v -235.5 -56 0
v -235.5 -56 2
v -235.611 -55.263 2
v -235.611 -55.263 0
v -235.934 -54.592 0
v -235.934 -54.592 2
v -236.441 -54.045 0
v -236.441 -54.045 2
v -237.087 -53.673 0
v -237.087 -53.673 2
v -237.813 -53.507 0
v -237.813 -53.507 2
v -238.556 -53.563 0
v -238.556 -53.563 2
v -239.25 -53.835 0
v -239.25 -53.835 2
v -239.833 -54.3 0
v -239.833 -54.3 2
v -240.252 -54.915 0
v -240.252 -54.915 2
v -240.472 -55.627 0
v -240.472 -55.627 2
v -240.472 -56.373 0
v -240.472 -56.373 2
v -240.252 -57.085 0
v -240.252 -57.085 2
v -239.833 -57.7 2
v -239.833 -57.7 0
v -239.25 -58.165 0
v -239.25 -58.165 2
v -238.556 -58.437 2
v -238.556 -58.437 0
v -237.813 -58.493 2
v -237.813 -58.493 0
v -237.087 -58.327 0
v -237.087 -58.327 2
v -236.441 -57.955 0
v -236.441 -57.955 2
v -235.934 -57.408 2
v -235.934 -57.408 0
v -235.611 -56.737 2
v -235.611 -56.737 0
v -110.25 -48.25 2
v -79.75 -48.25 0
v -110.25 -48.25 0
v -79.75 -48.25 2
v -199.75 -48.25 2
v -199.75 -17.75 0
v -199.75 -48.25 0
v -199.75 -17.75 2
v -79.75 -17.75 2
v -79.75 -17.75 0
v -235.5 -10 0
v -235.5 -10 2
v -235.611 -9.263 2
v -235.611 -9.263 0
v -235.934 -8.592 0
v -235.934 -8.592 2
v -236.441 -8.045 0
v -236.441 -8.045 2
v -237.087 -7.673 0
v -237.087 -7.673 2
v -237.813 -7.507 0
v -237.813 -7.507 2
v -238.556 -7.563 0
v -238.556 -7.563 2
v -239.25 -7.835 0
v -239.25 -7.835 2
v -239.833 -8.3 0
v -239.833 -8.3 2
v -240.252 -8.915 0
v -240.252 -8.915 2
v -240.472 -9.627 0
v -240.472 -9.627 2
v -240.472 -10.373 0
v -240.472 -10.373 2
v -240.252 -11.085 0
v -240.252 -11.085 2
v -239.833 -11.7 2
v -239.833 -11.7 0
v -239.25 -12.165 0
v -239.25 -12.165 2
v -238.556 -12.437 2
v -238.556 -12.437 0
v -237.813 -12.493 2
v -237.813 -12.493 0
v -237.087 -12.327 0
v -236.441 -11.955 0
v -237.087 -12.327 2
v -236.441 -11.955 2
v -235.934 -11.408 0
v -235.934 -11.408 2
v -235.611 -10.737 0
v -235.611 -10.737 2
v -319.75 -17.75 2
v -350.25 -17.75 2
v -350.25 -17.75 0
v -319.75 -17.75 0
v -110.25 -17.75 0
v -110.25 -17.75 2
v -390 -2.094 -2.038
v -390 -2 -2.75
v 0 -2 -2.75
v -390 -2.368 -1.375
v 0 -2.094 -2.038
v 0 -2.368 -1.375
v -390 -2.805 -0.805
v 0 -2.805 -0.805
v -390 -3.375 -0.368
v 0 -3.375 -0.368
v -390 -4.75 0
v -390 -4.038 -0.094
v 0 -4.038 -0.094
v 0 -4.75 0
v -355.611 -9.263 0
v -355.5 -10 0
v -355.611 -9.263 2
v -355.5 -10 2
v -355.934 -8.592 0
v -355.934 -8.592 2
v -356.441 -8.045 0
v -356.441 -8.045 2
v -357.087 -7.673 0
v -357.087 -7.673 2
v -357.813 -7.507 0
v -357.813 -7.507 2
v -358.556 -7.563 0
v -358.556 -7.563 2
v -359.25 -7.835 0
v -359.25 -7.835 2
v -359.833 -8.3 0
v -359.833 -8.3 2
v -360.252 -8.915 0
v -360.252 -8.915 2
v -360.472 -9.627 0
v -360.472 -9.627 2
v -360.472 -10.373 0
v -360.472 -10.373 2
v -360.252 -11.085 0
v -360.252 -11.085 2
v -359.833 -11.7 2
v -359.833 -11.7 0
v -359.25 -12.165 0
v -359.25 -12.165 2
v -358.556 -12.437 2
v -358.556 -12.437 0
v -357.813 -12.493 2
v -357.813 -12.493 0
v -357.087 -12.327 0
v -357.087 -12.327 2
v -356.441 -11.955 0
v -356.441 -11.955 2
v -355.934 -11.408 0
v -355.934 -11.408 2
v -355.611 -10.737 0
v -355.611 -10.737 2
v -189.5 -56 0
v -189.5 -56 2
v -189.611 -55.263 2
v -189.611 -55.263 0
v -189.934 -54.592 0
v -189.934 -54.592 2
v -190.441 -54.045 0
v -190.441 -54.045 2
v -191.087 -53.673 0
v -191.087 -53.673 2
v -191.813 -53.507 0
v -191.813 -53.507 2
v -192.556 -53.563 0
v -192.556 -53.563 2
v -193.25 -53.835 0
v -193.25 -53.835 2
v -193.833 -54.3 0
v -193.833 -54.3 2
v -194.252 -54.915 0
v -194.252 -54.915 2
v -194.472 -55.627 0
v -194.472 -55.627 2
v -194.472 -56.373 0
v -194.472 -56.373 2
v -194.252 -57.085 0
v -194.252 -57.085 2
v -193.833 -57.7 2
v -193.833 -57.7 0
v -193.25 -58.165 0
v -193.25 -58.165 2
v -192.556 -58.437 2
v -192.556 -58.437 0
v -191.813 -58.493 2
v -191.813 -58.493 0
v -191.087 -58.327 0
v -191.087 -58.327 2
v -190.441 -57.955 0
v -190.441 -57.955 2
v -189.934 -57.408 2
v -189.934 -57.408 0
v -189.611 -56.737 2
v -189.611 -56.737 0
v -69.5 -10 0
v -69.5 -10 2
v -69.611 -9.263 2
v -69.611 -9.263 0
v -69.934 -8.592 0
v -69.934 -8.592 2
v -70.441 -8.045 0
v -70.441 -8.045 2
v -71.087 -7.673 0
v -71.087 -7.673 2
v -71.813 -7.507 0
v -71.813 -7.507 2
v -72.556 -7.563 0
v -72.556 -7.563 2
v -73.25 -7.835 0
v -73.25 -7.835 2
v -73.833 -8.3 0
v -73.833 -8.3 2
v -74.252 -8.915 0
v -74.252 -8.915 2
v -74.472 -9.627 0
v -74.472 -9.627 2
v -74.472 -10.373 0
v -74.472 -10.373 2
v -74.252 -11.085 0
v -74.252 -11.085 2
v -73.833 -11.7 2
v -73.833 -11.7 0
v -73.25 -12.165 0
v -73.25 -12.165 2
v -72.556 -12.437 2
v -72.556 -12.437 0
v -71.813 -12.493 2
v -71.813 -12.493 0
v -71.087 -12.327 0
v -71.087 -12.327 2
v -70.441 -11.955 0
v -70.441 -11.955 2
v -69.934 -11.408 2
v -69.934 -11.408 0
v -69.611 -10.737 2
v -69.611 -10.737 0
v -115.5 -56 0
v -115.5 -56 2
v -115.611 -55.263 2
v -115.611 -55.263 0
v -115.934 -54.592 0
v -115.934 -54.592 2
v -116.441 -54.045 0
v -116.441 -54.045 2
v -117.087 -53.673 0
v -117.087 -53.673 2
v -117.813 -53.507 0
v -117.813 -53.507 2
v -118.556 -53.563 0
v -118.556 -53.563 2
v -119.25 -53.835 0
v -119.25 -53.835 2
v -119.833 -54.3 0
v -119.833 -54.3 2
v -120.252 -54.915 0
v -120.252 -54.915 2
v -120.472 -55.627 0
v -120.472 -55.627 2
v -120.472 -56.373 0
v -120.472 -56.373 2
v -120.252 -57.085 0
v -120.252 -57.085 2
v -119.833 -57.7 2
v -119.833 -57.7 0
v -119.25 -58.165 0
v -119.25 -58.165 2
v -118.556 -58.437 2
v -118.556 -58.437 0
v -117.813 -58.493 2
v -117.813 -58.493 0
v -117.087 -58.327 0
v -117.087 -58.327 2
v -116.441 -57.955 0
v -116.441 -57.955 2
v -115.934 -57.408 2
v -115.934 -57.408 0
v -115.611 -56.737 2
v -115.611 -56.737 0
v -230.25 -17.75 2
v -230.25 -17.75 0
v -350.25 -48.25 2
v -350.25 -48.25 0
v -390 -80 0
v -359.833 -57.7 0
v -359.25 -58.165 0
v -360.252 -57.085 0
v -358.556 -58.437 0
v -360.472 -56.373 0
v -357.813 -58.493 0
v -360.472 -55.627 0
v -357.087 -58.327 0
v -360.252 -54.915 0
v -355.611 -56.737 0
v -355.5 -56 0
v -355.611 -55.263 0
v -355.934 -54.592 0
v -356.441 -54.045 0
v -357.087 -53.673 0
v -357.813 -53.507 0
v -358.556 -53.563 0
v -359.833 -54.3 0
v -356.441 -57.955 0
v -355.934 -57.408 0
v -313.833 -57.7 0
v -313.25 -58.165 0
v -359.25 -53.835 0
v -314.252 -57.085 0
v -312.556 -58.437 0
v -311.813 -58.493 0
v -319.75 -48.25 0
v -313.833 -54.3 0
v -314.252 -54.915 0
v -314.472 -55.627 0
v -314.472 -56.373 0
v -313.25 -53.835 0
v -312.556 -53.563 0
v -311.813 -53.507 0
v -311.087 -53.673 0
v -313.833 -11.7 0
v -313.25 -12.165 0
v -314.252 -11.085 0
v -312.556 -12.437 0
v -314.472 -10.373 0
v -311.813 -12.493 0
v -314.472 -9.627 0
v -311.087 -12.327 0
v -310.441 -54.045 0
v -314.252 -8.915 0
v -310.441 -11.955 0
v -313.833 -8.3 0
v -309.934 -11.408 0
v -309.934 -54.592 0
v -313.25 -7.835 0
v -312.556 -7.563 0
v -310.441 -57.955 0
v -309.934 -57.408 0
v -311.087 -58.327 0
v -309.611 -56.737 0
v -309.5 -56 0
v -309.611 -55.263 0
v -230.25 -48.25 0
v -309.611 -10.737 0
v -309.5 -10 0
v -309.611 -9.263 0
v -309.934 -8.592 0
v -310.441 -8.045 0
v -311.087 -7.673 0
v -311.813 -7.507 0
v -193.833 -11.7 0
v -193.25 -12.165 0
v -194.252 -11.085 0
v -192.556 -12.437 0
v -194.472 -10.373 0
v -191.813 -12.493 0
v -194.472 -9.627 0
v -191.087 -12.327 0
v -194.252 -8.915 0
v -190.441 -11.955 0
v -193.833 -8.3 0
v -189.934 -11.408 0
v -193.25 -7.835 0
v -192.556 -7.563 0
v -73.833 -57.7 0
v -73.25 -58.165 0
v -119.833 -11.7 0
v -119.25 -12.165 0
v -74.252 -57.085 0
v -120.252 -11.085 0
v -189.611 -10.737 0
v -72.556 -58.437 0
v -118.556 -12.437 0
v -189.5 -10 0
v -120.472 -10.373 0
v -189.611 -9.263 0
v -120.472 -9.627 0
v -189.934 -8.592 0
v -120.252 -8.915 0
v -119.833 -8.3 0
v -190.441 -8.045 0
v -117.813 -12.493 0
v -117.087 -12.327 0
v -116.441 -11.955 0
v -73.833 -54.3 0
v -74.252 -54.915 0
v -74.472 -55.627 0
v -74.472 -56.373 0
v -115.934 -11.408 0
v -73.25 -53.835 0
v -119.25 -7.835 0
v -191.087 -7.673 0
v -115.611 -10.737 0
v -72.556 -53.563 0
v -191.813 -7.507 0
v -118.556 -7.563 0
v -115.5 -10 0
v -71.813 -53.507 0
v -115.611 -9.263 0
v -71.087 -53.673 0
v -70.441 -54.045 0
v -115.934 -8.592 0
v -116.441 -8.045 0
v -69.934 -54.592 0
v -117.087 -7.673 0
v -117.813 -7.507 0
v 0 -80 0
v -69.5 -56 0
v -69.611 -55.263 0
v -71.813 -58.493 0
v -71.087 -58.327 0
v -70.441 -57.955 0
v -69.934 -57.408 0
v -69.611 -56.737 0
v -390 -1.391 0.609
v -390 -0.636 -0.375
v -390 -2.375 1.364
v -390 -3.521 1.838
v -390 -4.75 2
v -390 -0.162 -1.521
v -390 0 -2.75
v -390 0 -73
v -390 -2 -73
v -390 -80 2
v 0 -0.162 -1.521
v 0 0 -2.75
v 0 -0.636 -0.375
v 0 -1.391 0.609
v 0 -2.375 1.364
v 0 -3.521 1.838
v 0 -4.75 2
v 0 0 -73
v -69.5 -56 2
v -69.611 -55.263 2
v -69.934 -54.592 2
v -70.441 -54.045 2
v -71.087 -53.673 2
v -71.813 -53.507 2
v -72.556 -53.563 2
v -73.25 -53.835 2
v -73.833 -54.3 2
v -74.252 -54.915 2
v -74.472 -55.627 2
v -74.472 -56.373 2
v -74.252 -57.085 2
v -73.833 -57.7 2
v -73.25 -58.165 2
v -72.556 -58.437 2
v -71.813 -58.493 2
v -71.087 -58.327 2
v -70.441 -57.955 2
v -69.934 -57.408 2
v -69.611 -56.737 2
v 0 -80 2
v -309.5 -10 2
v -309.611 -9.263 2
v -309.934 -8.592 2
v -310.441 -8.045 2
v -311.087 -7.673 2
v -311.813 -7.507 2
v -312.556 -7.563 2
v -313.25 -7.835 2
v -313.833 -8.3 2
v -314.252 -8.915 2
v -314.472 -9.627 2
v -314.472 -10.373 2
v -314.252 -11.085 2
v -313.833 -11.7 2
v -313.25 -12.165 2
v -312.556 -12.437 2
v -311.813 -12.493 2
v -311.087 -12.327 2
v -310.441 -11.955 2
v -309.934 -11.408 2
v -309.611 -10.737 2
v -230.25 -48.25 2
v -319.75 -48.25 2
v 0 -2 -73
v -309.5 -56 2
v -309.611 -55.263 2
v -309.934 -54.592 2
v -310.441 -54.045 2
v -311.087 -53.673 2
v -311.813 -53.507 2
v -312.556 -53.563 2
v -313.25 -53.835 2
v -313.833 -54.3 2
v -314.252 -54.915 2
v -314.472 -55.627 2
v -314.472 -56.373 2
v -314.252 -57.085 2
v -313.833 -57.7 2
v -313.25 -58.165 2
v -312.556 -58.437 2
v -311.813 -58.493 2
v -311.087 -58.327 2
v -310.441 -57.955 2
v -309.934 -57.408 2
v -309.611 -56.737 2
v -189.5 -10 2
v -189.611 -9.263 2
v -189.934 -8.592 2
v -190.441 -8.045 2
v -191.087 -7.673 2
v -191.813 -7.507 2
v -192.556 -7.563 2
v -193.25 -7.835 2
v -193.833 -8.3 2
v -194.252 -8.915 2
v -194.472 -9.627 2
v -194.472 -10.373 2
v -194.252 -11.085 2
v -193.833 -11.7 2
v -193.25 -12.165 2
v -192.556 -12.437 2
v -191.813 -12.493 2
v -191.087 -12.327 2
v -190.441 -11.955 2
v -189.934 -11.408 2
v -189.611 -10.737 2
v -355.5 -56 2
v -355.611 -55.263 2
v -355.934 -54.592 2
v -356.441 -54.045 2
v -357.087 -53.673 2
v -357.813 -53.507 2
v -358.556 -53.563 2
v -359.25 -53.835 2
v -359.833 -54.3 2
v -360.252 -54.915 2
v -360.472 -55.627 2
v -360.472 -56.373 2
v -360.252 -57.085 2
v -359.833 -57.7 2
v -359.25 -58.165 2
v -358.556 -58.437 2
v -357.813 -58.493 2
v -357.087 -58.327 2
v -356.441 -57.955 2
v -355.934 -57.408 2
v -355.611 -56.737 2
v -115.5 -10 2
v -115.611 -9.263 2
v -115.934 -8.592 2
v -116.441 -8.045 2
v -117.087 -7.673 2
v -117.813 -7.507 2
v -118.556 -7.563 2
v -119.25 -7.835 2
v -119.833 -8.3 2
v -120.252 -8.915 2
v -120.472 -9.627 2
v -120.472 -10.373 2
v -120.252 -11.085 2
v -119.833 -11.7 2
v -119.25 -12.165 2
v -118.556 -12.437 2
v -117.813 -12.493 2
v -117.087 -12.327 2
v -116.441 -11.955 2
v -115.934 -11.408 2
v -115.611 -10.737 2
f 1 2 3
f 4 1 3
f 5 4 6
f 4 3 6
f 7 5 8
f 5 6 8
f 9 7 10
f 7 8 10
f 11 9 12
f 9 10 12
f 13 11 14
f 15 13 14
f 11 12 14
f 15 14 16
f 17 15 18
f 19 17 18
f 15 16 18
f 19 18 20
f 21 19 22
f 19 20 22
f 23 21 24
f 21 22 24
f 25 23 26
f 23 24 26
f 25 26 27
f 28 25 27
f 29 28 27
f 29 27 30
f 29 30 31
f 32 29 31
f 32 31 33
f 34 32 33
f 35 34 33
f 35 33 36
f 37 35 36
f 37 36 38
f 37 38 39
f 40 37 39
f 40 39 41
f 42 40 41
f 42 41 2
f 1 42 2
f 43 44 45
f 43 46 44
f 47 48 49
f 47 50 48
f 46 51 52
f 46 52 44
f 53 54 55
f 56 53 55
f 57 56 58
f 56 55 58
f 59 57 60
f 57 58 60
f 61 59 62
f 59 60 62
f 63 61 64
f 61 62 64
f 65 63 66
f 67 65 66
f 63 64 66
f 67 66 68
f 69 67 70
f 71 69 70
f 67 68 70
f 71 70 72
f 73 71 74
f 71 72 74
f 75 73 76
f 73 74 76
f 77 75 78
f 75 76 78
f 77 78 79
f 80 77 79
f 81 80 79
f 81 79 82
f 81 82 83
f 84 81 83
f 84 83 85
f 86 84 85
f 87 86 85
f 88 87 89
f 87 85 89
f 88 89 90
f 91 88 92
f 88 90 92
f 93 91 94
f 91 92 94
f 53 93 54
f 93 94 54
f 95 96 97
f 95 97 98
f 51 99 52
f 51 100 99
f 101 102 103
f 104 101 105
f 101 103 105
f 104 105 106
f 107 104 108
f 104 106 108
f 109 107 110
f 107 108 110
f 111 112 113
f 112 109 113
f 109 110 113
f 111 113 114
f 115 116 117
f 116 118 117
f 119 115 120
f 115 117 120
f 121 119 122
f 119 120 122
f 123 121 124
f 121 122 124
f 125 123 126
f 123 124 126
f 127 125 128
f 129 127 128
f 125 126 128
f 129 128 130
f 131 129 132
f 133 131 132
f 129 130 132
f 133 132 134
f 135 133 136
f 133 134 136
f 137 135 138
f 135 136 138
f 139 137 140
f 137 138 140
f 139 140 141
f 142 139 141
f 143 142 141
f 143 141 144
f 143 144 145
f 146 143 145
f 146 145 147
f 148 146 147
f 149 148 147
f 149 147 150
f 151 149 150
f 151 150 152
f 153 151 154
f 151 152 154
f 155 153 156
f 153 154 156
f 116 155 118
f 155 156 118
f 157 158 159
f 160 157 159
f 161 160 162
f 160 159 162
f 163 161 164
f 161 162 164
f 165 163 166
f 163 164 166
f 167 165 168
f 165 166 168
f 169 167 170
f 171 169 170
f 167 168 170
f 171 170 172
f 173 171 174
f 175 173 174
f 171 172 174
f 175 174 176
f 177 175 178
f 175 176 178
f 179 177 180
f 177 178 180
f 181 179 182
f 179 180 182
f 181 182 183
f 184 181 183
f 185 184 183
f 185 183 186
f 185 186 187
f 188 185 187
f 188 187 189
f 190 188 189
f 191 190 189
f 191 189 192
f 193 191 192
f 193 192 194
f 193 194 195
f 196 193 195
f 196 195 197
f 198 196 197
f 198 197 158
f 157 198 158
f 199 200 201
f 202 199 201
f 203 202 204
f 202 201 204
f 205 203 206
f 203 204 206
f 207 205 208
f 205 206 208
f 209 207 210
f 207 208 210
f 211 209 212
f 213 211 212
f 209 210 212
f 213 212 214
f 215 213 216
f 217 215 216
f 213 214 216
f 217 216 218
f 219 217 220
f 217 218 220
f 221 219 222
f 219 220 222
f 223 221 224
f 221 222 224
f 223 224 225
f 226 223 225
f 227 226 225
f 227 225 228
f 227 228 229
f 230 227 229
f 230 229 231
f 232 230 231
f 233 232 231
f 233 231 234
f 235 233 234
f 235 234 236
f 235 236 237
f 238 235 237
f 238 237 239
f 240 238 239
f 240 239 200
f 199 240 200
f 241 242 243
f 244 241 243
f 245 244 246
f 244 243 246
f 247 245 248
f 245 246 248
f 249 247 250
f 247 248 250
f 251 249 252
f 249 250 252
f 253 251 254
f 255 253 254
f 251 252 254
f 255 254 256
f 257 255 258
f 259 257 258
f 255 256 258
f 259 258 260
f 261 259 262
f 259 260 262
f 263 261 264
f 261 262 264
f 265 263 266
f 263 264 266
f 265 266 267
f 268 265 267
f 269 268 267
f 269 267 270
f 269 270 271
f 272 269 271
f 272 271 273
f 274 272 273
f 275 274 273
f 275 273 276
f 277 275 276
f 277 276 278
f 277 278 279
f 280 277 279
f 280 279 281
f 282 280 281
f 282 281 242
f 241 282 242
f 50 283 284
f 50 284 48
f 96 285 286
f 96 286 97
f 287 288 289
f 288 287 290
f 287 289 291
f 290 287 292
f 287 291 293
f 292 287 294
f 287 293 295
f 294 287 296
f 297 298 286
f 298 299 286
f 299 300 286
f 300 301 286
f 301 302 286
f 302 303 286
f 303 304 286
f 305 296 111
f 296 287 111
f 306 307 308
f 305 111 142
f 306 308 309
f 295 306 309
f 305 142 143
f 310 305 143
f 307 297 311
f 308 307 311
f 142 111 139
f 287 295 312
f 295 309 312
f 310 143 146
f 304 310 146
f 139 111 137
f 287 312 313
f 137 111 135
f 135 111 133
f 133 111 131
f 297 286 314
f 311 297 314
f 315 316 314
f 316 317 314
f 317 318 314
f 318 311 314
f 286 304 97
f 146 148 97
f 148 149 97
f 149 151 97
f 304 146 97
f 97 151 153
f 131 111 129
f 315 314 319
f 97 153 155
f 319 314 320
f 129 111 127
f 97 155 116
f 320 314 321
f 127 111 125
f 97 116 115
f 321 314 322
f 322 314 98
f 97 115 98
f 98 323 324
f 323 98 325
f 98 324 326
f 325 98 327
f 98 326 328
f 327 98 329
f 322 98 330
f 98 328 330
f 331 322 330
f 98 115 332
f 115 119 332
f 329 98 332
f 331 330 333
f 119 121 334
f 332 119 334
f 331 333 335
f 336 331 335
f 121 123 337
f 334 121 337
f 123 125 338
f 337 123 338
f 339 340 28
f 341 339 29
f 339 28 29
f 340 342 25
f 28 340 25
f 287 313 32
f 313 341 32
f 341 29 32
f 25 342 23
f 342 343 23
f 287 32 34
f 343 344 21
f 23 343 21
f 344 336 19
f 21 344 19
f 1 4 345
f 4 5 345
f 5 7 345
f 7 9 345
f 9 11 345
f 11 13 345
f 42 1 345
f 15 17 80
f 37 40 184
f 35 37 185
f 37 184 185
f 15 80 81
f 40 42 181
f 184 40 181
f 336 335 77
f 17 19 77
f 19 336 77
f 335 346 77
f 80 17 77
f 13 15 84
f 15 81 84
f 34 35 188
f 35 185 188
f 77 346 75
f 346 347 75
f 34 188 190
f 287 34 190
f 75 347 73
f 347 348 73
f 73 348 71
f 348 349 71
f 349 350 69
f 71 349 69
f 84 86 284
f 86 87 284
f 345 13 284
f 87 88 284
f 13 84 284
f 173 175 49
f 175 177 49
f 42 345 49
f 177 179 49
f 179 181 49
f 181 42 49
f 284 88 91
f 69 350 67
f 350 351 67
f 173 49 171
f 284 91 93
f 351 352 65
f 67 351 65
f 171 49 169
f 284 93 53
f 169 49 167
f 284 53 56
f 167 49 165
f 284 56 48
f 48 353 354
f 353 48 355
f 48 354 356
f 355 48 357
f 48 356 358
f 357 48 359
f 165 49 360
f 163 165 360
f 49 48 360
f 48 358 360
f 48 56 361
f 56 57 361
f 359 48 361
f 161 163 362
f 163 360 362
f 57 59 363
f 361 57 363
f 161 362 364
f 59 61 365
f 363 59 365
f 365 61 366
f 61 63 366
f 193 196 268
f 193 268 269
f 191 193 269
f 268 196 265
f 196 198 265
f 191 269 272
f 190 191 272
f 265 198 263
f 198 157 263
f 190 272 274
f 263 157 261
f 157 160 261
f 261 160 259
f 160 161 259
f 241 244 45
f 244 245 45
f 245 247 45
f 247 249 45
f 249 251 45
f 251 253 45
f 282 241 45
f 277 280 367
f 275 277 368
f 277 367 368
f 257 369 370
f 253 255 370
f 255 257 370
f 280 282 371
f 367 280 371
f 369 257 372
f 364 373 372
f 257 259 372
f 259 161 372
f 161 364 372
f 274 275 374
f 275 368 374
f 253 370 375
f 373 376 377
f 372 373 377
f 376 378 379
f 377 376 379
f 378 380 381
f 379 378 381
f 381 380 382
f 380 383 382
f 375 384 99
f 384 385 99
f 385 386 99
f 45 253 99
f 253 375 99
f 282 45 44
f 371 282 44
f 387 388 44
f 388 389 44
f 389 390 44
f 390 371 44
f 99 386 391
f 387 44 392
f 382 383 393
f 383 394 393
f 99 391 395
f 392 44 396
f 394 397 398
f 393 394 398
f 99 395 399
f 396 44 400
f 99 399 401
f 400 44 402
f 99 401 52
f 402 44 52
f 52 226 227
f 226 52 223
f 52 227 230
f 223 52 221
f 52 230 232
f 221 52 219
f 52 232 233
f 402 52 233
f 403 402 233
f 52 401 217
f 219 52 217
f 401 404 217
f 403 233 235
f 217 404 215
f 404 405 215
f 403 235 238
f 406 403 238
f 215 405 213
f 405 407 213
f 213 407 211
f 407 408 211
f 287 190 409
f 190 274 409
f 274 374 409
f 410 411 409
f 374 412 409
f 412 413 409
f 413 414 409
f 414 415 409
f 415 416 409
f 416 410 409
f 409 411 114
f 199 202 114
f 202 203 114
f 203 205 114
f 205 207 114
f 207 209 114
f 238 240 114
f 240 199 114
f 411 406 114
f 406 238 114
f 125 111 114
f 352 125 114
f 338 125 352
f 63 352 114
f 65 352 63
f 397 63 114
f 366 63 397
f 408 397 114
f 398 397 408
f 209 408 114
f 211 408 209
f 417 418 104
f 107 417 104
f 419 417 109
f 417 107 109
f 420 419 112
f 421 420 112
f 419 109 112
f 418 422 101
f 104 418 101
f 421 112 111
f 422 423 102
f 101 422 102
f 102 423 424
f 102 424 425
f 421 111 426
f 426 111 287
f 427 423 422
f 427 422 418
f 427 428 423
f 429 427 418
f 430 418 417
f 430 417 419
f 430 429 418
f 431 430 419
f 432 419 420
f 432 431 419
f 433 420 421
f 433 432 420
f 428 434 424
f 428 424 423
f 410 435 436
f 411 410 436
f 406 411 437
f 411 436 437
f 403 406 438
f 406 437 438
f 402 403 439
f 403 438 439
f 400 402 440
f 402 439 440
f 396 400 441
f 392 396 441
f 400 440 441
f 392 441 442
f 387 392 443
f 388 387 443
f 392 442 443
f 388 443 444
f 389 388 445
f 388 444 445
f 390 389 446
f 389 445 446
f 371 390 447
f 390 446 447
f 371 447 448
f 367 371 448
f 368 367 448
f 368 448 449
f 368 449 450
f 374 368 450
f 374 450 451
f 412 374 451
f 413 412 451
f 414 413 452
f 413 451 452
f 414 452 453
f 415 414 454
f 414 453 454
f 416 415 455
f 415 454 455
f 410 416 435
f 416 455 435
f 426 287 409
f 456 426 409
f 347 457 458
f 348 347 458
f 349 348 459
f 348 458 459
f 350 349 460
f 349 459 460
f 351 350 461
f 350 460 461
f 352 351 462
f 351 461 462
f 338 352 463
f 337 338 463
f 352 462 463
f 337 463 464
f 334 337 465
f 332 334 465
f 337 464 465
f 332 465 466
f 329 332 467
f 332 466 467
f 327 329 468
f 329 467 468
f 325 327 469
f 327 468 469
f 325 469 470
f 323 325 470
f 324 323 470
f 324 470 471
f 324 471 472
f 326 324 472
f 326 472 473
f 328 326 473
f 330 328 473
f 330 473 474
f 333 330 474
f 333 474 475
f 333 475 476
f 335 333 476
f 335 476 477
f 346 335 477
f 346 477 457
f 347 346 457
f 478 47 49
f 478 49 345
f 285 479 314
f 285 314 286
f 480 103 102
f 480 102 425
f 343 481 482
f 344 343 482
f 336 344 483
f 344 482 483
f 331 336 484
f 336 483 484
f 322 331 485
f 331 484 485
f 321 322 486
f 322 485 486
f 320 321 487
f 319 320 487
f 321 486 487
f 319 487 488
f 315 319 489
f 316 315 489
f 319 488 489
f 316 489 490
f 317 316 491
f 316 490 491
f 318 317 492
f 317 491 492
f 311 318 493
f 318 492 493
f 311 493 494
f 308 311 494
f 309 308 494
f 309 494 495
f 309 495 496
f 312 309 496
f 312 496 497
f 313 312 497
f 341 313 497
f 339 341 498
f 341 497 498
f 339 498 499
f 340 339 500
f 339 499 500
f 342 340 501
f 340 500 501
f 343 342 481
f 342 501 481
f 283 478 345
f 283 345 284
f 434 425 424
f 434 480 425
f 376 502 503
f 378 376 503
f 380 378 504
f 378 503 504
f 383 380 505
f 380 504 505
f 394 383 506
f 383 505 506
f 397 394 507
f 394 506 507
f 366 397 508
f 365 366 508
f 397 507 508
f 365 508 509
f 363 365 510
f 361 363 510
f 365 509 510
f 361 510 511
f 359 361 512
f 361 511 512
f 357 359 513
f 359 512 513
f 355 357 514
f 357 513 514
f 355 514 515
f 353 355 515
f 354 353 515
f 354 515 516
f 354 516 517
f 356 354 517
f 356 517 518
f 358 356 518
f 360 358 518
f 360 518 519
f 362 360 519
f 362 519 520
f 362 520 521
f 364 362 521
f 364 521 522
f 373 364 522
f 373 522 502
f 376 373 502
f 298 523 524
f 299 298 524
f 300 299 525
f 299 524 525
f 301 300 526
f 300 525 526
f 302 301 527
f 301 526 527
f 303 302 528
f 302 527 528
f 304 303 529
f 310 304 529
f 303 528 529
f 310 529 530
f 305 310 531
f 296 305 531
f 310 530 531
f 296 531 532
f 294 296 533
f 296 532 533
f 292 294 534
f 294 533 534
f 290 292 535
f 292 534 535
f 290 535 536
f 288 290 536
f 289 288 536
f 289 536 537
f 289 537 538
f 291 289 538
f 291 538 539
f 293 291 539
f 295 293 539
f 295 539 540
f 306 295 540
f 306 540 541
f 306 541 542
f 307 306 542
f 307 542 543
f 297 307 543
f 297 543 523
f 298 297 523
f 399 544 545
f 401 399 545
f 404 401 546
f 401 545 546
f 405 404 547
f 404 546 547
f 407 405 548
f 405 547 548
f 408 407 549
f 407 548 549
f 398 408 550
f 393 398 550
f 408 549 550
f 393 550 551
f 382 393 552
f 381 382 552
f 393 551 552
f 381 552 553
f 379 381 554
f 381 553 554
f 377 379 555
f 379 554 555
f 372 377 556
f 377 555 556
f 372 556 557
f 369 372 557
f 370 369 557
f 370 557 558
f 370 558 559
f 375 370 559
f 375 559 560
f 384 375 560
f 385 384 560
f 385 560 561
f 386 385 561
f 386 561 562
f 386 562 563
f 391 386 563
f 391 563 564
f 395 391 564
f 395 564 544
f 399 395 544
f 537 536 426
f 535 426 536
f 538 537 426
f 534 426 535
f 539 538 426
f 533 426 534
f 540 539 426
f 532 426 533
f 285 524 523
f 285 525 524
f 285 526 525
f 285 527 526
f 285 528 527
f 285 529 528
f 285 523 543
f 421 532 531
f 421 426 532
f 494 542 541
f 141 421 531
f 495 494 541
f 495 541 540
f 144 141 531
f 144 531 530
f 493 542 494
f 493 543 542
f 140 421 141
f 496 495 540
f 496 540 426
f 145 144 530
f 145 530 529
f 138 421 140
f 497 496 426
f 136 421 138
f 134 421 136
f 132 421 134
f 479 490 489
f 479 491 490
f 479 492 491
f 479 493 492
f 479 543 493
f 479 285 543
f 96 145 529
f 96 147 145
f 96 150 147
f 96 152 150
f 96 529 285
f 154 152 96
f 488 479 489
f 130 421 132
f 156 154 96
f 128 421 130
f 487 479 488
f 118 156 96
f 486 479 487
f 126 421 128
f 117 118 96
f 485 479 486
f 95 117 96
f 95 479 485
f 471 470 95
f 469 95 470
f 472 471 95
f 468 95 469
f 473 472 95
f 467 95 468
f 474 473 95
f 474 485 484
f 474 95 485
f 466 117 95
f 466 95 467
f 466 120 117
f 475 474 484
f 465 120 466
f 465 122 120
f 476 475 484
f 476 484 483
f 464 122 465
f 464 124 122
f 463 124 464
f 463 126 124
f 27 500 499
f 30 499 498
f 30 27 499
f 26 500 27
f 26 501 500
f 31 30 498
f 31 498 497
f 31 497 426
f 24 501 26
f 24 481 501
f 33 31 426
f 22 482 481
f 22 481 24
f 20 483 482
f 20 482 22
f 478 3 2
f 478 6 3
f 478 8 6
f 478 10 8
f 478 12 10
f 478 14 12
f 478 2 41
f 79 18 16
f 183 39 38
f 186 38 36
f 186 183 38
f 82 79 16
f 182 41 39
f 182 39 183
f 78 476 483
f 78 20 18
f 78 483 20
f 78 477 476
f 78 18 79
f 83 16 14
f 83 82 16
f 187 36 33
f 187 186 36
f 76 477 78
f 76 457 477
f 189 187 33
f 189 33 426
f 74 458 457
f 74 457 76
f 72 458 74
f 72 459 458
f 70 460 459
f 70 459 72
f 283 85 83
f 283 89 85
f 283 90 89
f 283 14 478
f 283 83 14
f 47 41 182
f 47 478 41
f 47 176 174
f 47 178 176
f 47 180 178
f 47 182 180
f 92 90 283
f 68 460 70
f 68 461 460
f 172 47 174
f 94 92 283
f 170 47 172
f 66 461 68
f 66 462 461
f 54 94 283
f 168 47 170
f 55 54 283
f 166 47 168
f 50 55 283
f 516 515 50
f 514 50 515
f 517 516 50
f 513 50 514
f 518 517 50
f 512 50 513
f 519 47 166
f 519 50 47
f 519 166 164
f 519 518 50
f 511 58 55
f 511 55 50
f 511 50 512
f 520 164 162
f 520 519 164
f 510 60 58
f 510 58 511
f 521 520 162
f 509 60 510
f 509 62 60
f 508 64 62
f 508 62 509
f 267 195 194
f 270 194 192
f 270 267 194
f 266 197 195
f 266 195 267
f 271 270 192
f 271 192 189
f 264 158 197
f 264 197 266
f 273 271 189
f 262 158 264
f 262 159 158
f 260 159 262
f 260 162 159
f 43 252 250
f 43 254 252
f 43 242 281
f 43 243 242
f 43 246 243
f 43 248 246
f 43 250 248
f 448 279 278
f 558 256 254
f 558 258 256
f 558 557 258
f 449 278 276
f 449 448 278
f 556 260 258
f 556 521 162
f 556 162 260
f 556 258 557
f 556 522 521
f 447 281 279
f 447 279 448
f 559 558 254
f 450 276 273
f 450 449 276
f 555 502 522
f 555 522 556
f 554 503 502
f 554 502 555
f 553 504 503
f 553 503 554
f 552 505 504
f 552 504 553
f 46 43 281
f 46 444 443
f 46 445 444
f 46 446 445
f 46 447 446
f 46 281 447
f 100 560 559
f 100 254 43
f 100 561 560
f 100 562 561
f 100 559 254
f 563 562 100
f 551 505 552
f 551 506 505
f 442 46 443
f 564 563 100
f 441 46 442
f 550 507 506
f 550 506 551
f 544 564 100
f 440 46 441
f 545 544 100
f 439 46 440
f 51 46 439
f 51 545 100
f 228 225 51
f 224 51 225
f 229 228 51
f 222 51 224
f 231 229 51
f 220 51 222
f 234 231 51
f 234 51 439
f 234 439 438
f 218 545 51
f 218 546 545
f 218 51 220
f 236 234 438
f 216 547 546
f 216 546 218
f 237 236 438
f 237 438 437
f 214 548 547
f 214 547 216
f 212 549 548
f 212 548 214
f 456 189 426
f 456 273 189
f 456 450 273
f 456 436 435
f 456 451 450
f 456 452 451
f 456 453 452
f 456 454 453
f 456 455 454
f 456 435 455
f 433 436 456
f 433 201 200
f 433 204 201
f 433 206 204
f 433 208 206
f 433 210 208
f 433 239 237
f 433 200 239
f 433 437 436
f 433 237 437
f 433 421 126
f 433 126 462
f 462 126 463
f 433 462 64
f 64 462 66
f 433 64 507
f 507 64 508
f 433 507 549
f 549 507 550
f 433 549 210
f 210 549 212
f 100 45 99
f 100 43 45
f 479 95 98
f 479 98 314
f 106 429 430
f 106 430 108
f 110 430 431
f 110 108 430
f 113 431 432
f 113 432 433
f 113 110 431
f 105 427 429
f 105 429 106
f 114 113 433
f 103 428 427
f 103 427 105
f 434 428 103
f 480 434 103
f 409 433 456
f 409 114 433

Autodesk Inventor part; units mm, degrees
ref_plane "YZ Plane" through (0, 0, 0) normal (1, 0, 0) x (0, 1, 0)
ref_plane "XZ Plane" through (0, 0, 0) normal (0, 1, 0) x (-1, 0, 0)
ref_plane "XY Plane" through (0, 0, 0) normal (0, 0, 1) x (1, 0, 0)
sketch "Sketch1" plane through (0, 0, 0) normal (0, 0, 1) x (1, 0, 0)
  line L0 (0, 0) -> (-390, 0)
  line L1 (0, -80) -> (0, 0)
  line L2 (-390, 0) -> (-390, -80)
  line L3 (-390, -80) -> (0, -80)
  point P0 (0, -40)
  dimension "d32" = 80
  dimension "d60" = 80
  dimension "d61" = 390
extrude "Plate1" add sketch "Sketch1" along normal blind 2
sketch "Sketch8" plane through (0, 0, 2) normal (0, 0, 1) x (1, 0, 0)
  line L0 (-79.75, -48.25) -> (-110.25, -48.25)
  line L1 (-110.25, -48.25) -> (-110.25, -17.75)
  line L2 (-110.25, -17.75) -> (-79.75, -17.75)
  line L3 (-79.75, -17.75) -> (-79.75, -48.25)
  line L4 (-79.75, -48.25) -> (-110.25, -17.75) construction
  line L5 (-110.25, -48.25) -> (-79.75, -17.75) construction
  circle A0 centre (-72, -56) radius 2.5
  circle A1 centre (-118, -56) radius 2.5
  circle A2 centre (-118, -10) radius 2.5
  circle A3 centre (-72, -10) radius 2.5
  line L6 (0, 0) -> (0, -80) projected
  line L7 (-390, 0) -> (0, 0) projected
  line L8 (-110.25, -48.25) -> (-118, -56) construction
  line L9 (-118, -10) -> (-72, -10) construction
  line L10 (-72, -10) -> (-72, -56) construction
  line L11 (-72, -56) -> (-118, -56) construction
  line L12 (-118, -56) -> (-118, -10) construction
  point P0 (-95, -33)
  dimension "d51" = 30.5
  dimension "d52" = 30.5
  dimension "d53" = 5
  dimension "d72" = 95
  dimension "d78" = 46
  dimension "d79" = 10
extrude "Cut3" cut sketch "Sketch8" against normal blind 2
pattern_linear "Rectangular Pattern1" count 3 spacing 120 along (-1, 0, 0) of "Cut3"
sketch "Sketch9" plane through (0, -2, 2) normal (0, 1, 0) x (-1, 0, 0)
  line L0 (390, 0) -> (0, 0)
  line L1 (0, 0) -> (0, -75)
  line L2 (0, -75) -> (390, -75)
  line L3 (390, -75) -> (390, 0)
edge flange "Flange3" height 75 angle 90 thickness 2 bend radius 2.75 thickness toward (0, 1, 0) relief round relief width 2 relief depth 1 edges at (-195, 0, 0) wall of the first edge with corners at (-390, -2, 2) (0, -2, 2) (0, -2, -73) (-390, -2, -73)
bend "Bend3"
corner "Corner3"
equation "\"d51\" = d52"
equation "\"d55\" = Thickness"
equation "\"d2\" = Thickness"
equation "\"d62\" = BendReliefWidth"
equation "\"d63\" = BendReliefDepth"
equation "\"d64\" = MinimumRemnant"
equation "\"d65\" = TransitionRadius"
equation "\"d68\" = BendRadius"
equation "\"d69\" = CornerReliefSize"
equation "\"d70\" = GapSize"
equation "\"d71\" = JacobiRadiusSize"
equation "\"BendReliefWidth\" = Thickness"
equation "\"BendReliefDepth\" = 0.5 * Thickness"
equation "\"CornerReliefSize\" = 4 * Thickness"
equation "\"MinimumRemnant\" = 2 * Thickness"
equation "\"TransitionRadius\" = BendRadius"
equation "\"JacobiRadiusSize\" = BendRadius"
equation "\"GapSize\" = Thickness"
equation "\"Thickness\" = 2"
equation "\"BendRadius\" = 2.75"
properties part number "PRS-1422 BOTTOM FDS diameter way up_CPY" material "Stainless Steel"
